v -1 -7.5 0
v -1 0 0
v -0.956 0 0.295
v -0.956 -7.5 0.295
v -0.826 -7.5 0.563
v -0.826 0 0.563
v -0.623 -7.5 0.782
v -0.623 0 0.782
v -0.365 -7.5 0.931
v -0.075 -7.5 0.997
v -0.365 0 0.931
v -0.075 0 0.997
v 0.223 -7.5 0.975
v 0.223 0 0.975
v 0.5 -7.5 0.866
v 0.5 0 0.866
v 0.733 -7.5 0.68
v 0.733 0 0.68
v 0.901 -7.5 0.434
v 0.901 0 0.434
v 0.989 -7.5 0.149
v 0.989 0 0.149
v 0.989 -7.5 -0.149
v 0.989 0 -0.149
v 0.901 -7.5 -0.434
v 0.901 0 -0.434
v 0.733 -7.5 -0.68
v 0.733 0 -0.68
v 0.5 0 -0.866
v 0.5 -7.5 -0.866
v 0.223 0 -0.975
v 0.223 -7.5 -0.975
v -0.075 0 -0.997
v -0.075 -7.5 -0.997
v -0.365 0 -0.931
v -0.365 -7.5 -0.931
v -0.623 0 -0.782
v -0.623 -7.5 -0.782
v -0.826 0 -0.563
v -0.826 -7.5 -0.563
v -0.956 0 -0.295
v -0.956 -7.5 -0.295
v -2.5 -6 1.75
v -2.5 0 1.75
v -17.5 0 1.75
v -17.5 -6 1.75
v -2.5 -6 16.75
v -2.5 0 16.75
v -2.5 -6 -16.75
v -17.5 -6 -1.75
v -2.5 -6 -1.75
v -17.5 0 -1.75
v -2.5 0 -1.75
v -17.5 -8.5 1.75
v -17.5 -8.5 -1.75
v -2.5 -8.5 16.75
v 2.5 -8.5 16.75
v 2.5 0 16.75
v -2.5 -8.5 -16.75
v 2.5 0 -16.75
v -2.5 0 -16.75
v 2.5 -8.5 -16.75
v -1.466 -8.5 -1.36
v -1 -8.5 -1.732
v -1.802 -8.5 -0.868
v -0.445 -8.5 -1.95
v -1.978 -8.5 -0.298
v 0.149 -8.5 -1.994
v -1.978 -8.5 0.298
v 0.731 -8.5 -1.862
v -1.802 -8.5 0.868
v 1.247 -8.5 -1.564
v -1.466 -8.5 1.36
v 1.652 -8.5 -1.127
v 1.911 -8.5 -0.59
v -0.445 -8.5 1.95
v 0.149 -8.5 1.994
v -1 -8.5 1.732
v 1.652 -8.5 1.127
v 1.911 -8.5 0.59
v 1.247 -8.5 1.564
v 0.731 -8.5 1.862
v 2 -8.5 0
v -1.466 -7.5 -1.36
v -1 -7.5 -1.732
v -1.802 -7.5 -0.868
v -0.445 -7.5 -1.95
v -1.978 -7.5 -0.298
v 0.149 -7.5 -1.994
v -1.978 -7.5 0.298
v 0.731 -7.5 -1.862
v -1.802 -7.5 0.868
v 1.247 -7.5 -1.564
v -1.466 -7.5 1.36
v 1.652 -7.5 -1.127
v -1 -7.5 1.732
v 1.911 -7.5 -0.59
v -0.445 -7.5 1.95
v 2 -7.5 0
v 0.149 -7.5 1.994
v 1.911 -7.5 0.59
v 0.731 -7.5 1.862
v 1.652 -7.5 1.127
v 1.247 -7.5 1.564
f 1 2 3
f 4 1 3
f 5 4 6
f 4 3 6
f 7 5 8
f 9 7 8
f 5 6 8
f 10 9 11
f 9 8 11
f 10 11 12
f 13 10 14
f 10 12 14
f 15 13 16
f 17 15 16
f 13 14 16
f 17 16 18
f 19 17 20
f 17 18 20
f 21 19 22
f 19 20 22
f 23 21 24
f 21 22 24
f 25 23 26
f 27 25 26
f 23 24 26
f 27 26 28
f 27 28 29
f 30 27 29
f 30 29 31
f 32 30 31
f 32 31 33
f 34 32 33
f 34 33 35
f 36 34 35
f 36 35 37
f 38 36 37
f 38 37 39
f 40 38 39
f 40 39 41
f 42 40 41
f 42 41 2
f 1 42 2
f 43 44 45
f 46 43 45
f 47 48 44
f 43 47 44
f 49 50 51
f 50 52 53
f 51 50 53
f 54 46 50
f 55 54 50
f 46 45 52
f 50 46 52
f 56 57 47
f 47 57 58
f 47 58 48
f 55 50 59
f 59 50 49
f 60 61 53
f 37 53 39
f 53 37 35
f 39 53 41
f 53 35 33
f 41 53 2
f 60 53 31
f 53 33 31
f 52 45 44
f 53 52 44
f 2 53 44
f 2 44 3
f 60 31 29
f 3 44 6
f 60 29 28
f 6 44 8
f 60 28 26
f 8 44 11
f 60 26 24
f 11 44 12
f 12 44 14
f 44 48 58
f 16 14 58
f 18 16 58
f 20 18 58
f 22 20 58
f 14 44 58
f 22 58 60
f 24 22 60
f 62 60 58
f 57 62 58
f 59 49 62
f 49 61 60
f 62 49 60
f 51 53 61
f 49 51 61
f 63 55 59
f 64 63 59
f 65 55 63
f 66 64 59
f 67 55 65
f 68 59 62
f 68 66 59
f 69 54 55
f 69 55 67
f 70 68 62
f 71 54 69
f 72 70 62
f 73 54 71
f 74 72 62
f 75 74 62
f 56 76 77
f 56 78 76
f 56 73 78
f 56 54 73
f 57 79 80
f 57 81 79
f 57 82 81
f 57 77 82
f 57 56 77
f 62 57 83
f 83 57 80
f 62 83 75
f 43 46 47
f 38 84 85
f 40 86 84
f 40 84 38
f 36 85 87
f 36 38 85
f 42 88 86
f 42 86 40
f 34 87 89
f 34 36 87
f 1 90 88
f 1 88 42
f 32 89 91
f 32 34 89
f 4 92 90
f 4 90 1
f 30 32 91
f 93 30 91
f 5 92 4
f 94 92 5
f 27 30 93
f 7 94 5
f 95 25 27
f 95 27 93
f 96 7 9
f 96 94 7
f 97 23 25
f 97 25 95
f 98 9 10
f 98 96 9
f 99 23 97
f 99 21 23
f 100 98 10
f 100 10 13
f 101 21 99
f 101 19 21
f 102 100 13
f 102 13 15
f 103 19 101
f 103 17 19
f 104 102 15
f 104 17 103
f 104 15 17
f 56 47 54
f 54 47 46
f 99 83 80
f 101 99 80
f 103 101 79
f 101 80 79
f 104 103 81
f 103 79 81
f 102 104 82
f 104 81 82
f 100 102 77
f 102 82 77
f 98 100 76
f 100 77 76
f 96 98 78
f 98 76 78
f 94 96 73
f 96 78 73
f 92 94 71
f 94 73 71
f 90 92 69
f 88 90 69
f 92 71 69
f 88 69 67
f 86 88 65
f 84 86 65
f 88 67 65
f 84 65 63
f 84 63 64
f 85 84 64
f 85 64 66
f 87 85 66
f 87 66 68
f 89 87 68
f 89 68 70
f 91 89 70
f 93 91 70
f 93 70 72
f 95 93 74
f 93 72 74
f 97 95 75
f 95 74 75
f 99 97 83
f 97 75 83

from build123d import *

# Parameters (mm, degrees)
F1_DEPTH = 6
F3_DEPTH = 2.5
F4_R     = 1
F5_DEPTH = 8.501
F6_R     = 2
F7_DEPTH = 1


with BuildPart() as f1:
    # F0 (on Front) → F1 (new body)
    with BuildSketch(Plane.XZ):
        Polygon((2.5, 1), (2.5, 16.75), (-2.5, 16.75), (-2.5, 1.75), (-17.5, 1.75), (-17.5, -1.75), (-2.5, -1.75), (-2.5, -16.75), (2.5, -16.75), (2.5, -2.5), align=None)
    extrude(amount=F1_DEPTH)

    # F2 (on face) → F3 (join)
    with BuildSketch(Plane.XZ.offset(6)):
        Polygon((-2.5, 16.75), (-17.5, 1.75), (-17.5, 0), (-17.5, -1.75), (-2.5, -16.75), (0, -16.75), (2.5, -16.75), (2.5, 16.75), (0, 16.75), align=None)
    extrude(amount=F3_DEPTH)

    # F4 (on face) → F5 (cut, through all)
    with BuildSketch(Plane(origin=(0, 0, 0), x_dir=(-1, 0, 0), z_dir=(0, 1, 0))):
        Circle(F4_R)
    extrude(amount=-F5_DEPTH, mode=Mode.SUBTRACT)

    # F6 (on face) → F7 (cut)
    with BuildSketch(Plane.XZ.offset(8.5)):
        Circle(F6_R)
    extrude(amount=-F7_DEPTH, mode=Mode.SUBTRACT)


solid = f1.part
